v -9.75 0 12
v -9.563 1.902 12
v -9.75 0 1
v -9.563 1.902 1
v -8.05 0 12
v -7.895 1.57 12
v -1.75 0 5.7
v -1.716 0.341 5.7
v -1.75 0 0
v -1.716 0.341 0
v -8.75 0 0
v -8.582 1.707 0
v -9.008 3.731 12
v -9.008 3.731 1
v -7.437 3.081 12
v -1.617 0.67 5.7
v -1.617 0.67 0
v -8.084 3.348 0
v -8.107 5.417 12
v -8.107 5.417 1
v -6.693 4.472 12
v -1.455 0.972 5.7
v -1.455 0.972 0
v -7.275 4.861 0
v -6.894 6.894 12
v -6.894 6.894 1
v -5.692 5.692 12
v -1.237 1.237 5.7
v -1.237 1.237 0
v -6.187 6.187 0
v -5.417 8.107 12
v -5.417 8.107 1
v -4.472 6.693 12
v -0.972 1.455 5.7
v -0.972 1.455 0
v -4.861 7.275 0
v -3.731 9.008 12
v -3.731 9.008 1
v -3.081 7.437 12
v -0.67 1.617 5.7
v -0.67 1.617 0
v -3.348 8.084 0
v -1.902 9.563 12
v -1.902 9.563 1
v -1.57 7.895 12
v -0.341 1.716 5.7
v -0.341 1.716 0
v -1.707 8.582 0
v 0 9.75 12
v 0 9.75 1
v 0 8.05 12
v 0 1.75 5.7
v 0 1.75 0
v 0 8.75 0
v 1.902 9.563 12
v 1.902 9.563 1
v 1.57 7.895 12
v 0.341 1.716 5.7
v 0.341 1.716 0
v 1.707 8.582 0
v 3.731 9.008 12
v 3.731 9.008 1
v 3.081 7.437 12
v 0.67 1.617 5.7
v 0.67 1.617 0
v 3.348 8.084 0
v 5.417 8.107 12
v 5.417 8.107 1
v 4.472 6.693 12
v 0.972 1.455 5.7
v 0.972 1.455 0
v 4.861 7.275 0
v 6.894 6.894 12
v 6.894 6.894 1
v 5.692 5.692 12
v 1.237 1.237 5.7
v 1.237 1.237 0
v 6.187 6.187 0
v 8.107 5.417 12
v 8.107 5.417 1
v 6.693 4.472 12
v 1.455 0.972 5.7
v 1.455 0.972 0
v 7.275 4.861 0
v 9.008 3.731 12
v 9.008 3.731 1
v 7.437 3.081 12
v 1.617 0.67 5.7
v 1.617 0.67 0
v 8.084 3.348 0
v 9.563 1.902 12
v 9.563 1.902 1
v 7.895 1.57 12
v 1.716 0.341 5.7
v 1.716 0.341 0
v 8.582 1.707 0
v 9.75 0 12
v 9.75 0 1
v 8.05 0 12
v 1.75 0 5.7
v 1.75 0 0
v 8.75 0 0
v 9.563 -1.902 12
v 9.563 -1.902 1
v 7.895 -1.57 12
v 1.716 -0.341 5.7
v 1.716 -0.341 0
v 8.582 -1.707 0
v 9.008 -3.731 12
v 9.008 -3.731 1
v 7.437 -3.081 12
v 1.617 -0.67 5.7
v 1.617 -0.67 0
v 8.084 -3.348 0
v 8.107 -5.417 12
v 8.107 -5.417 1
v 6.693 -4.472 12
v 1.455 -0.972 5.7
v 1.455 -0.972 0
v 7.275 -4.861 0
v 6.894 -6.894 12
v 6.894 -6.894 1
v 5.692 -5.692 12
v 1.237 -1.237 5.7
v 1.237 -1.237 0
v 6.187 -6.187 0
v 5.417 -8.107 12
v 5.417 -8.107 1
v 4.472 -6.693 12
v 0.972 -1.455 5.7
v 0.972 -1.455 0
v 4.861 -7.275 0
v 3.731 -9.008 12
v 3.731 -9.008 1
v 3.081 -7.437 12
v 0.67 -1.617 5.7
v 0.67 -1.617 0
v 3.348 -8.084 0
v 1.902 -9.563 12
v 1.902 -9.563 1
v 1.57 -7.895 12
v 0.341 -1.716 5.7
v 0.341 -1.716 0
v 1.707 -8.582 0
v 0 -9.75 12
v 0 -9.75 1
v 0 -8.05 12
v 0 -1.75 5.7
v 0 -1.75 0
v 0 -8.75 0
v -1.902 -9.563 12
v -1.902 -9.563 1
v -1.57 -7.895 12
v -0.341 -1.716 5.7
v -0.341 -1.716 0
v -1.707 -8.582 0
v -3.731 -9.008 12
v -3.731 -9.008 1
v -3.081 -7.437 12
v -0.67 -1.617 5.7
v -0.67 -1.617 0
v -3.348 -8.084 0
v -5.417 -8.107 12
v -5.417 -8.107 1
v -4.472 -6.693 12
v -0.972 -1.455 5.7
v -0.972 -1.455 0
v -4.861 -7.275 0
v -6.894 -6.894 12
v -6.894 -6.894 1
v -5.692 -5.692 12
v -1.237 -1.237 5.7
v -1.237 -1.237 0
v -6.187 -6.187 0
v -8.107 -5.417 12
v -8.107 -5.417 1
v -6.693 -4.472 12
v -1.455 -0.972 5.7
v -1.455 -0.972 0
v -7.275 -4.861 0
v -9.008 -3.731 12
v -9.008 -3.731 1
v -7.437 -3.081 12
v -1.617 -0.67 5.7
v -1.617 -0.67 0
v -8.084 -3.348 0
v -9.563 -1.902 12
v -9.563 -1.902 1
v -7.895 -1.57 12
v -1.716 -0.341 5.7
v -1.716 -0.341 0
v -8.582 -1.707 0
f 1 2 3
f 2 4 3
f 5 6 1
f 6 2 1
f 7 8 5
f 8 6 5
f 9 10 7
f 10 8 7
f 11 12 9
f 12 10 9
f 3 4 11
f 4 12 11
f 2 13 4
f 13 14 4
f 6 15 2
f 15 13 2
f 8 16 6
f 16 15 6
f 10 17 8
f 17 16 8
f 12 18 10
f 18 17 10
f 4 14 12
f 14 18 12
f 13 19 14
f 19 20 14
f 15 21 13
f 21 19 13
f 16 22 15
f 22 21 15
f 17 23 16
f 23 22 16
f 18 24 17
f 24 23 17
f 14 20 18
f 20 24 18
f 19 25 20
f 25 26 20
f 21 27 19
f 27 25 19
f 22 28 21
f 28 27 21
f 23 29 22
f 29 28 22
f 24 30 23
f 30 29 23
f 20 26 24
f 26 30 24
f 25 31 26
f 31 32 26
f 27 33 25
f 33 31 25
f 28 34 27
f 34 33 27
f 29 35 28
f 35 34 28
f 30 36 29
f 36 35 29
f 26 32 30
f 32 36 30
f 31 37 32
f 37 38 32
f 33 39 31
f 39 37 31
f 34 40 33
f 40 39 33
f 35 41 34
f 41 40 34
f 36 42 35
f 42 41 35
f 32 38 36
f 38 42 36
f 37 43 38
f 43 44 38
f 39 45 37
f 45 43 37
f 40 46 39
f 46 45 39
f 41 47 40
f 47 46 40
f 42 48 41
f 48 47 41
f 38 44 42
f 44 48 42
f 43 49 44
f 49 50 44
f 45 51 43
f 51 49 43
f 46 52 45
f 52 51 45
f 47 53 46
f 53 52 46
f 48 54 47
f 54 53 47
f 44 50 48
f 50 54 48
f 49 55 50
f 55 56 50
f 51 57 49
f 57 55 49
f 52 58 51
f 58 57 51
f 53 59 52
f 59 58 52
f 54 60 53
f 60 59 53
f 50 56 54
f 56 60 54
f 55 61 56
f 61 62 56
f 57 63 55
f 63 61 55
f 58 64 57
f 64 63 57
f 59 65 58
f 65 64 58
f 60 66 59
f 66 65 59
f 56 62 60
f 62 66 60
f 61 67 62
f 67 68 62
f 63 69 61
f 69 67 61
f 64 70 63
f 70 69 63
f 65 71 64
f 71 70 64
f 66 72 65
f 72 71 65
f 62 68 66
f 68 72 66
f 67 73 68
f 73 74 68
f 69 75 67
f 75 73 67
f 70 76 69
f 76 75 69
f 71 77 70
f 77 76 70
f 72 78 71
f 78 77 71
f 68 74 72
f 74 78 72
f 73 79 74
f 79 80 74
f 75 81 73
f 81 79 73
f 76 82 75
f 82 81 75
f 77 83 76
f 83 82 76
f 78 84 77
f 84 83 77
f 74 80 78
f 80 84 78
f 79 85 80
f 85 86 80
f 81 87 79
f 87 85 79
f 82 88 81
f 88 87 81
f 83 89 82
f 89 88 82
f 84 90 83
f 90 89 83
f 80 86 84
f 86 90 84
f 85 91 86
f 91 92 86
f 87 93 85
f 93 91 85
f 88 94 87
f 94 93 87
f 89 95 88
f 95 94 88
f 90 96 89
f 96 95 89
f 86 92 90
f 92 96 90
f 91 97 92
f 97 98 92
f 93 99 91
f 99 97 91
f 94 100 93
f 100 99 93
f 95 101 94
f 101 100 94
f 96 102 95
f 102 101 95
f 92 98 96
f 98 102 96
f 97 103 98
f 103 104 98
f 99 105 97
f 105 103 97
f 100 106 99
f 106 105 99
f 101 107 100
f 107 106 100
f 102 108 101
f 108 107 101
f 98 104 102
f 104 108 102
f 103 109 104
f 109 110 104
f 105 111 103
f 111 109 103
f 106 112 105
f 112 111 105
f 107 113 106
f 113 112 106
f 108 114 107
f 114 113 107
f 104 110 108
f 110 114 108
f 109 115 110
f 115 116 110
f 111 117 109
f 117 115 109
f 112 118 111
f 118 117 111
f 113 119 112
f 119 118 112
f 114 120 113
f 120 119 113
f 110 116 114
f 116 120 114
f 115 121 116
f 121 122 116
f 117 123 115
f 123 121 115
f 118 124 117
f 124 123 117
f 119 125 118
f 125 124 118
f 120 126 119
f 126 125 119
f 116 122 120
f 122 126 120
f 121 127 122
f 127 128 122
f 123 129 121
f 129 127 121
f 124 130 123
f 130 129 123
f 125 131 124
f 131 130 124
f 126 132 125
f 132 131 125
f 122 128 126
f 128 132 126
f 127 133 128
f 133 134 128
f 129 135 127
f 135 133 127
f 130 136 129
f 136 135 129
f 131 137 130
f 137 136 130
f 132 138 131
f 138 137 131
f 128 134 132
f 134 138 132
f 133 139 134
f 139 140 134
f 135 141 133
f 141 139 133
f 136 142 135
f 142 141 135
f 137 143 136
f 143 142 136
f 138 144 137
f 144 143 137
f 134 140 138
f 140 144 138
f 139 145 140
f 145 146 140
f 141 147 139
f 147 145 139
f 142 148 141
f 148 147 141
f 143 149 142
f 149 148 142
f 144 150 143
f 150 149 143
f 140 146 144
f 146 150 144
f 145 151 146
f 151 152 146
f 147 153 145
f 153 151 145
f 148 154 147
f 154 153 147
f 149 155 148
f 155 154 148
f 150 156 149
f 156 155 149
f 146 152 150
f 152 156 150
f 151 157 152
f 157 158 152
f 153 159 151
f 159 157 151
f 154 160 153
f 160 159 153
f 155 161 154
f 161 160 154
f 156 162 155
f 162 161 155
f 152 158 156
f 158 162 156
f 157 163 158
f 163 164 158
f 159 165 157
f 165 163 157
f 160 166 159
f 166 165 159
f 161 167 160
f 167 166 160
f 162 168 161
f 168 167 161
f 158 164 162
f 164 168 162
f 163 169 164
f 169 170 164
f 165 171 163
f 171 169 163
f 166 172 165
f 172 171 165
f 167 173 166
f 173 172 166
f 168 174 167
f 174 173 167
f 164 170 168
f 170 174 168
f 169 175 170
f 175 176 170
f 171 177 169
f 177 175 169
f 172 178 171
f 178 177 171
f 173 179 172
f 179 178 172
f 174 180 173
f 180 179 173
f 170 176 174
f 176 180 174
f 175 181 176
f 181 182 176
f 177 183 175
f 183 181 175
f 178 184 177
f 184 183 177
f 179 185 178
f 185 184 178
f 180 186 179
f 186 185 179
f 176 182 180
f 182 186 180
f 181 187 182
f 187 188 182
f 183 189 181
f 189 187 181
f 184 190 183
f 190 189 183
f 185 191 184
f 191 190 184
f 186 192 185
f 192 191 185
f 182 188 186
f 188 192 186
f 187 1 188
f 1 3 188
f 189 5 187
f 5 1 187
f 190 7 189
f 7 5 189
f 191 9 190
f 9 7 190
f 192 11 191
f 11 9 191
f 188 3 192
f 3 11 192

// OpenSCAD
$fn = 32;

// ----------------------------------------------------------------------
// Form washer: countersunk washer, 19.5 mm outside, 3.5 mm bore
// ----------------------------------------------------------------------

// --- parameters (mm) ---
revolve_angle = 360;      // full turn around the Z axis
profile_points = 6;       // points of the closed outline

profile = [[1.75, 0], [8.75, 0], [9.75, 1], [9.75, 12], [8.05, 12], [1.75, 5.7]];  // single closed polygon, 6 points, counter clockwise

// --- the one profile operation ---
rotate_extrude(angle = revolve_angle) polygon(points = profile);
